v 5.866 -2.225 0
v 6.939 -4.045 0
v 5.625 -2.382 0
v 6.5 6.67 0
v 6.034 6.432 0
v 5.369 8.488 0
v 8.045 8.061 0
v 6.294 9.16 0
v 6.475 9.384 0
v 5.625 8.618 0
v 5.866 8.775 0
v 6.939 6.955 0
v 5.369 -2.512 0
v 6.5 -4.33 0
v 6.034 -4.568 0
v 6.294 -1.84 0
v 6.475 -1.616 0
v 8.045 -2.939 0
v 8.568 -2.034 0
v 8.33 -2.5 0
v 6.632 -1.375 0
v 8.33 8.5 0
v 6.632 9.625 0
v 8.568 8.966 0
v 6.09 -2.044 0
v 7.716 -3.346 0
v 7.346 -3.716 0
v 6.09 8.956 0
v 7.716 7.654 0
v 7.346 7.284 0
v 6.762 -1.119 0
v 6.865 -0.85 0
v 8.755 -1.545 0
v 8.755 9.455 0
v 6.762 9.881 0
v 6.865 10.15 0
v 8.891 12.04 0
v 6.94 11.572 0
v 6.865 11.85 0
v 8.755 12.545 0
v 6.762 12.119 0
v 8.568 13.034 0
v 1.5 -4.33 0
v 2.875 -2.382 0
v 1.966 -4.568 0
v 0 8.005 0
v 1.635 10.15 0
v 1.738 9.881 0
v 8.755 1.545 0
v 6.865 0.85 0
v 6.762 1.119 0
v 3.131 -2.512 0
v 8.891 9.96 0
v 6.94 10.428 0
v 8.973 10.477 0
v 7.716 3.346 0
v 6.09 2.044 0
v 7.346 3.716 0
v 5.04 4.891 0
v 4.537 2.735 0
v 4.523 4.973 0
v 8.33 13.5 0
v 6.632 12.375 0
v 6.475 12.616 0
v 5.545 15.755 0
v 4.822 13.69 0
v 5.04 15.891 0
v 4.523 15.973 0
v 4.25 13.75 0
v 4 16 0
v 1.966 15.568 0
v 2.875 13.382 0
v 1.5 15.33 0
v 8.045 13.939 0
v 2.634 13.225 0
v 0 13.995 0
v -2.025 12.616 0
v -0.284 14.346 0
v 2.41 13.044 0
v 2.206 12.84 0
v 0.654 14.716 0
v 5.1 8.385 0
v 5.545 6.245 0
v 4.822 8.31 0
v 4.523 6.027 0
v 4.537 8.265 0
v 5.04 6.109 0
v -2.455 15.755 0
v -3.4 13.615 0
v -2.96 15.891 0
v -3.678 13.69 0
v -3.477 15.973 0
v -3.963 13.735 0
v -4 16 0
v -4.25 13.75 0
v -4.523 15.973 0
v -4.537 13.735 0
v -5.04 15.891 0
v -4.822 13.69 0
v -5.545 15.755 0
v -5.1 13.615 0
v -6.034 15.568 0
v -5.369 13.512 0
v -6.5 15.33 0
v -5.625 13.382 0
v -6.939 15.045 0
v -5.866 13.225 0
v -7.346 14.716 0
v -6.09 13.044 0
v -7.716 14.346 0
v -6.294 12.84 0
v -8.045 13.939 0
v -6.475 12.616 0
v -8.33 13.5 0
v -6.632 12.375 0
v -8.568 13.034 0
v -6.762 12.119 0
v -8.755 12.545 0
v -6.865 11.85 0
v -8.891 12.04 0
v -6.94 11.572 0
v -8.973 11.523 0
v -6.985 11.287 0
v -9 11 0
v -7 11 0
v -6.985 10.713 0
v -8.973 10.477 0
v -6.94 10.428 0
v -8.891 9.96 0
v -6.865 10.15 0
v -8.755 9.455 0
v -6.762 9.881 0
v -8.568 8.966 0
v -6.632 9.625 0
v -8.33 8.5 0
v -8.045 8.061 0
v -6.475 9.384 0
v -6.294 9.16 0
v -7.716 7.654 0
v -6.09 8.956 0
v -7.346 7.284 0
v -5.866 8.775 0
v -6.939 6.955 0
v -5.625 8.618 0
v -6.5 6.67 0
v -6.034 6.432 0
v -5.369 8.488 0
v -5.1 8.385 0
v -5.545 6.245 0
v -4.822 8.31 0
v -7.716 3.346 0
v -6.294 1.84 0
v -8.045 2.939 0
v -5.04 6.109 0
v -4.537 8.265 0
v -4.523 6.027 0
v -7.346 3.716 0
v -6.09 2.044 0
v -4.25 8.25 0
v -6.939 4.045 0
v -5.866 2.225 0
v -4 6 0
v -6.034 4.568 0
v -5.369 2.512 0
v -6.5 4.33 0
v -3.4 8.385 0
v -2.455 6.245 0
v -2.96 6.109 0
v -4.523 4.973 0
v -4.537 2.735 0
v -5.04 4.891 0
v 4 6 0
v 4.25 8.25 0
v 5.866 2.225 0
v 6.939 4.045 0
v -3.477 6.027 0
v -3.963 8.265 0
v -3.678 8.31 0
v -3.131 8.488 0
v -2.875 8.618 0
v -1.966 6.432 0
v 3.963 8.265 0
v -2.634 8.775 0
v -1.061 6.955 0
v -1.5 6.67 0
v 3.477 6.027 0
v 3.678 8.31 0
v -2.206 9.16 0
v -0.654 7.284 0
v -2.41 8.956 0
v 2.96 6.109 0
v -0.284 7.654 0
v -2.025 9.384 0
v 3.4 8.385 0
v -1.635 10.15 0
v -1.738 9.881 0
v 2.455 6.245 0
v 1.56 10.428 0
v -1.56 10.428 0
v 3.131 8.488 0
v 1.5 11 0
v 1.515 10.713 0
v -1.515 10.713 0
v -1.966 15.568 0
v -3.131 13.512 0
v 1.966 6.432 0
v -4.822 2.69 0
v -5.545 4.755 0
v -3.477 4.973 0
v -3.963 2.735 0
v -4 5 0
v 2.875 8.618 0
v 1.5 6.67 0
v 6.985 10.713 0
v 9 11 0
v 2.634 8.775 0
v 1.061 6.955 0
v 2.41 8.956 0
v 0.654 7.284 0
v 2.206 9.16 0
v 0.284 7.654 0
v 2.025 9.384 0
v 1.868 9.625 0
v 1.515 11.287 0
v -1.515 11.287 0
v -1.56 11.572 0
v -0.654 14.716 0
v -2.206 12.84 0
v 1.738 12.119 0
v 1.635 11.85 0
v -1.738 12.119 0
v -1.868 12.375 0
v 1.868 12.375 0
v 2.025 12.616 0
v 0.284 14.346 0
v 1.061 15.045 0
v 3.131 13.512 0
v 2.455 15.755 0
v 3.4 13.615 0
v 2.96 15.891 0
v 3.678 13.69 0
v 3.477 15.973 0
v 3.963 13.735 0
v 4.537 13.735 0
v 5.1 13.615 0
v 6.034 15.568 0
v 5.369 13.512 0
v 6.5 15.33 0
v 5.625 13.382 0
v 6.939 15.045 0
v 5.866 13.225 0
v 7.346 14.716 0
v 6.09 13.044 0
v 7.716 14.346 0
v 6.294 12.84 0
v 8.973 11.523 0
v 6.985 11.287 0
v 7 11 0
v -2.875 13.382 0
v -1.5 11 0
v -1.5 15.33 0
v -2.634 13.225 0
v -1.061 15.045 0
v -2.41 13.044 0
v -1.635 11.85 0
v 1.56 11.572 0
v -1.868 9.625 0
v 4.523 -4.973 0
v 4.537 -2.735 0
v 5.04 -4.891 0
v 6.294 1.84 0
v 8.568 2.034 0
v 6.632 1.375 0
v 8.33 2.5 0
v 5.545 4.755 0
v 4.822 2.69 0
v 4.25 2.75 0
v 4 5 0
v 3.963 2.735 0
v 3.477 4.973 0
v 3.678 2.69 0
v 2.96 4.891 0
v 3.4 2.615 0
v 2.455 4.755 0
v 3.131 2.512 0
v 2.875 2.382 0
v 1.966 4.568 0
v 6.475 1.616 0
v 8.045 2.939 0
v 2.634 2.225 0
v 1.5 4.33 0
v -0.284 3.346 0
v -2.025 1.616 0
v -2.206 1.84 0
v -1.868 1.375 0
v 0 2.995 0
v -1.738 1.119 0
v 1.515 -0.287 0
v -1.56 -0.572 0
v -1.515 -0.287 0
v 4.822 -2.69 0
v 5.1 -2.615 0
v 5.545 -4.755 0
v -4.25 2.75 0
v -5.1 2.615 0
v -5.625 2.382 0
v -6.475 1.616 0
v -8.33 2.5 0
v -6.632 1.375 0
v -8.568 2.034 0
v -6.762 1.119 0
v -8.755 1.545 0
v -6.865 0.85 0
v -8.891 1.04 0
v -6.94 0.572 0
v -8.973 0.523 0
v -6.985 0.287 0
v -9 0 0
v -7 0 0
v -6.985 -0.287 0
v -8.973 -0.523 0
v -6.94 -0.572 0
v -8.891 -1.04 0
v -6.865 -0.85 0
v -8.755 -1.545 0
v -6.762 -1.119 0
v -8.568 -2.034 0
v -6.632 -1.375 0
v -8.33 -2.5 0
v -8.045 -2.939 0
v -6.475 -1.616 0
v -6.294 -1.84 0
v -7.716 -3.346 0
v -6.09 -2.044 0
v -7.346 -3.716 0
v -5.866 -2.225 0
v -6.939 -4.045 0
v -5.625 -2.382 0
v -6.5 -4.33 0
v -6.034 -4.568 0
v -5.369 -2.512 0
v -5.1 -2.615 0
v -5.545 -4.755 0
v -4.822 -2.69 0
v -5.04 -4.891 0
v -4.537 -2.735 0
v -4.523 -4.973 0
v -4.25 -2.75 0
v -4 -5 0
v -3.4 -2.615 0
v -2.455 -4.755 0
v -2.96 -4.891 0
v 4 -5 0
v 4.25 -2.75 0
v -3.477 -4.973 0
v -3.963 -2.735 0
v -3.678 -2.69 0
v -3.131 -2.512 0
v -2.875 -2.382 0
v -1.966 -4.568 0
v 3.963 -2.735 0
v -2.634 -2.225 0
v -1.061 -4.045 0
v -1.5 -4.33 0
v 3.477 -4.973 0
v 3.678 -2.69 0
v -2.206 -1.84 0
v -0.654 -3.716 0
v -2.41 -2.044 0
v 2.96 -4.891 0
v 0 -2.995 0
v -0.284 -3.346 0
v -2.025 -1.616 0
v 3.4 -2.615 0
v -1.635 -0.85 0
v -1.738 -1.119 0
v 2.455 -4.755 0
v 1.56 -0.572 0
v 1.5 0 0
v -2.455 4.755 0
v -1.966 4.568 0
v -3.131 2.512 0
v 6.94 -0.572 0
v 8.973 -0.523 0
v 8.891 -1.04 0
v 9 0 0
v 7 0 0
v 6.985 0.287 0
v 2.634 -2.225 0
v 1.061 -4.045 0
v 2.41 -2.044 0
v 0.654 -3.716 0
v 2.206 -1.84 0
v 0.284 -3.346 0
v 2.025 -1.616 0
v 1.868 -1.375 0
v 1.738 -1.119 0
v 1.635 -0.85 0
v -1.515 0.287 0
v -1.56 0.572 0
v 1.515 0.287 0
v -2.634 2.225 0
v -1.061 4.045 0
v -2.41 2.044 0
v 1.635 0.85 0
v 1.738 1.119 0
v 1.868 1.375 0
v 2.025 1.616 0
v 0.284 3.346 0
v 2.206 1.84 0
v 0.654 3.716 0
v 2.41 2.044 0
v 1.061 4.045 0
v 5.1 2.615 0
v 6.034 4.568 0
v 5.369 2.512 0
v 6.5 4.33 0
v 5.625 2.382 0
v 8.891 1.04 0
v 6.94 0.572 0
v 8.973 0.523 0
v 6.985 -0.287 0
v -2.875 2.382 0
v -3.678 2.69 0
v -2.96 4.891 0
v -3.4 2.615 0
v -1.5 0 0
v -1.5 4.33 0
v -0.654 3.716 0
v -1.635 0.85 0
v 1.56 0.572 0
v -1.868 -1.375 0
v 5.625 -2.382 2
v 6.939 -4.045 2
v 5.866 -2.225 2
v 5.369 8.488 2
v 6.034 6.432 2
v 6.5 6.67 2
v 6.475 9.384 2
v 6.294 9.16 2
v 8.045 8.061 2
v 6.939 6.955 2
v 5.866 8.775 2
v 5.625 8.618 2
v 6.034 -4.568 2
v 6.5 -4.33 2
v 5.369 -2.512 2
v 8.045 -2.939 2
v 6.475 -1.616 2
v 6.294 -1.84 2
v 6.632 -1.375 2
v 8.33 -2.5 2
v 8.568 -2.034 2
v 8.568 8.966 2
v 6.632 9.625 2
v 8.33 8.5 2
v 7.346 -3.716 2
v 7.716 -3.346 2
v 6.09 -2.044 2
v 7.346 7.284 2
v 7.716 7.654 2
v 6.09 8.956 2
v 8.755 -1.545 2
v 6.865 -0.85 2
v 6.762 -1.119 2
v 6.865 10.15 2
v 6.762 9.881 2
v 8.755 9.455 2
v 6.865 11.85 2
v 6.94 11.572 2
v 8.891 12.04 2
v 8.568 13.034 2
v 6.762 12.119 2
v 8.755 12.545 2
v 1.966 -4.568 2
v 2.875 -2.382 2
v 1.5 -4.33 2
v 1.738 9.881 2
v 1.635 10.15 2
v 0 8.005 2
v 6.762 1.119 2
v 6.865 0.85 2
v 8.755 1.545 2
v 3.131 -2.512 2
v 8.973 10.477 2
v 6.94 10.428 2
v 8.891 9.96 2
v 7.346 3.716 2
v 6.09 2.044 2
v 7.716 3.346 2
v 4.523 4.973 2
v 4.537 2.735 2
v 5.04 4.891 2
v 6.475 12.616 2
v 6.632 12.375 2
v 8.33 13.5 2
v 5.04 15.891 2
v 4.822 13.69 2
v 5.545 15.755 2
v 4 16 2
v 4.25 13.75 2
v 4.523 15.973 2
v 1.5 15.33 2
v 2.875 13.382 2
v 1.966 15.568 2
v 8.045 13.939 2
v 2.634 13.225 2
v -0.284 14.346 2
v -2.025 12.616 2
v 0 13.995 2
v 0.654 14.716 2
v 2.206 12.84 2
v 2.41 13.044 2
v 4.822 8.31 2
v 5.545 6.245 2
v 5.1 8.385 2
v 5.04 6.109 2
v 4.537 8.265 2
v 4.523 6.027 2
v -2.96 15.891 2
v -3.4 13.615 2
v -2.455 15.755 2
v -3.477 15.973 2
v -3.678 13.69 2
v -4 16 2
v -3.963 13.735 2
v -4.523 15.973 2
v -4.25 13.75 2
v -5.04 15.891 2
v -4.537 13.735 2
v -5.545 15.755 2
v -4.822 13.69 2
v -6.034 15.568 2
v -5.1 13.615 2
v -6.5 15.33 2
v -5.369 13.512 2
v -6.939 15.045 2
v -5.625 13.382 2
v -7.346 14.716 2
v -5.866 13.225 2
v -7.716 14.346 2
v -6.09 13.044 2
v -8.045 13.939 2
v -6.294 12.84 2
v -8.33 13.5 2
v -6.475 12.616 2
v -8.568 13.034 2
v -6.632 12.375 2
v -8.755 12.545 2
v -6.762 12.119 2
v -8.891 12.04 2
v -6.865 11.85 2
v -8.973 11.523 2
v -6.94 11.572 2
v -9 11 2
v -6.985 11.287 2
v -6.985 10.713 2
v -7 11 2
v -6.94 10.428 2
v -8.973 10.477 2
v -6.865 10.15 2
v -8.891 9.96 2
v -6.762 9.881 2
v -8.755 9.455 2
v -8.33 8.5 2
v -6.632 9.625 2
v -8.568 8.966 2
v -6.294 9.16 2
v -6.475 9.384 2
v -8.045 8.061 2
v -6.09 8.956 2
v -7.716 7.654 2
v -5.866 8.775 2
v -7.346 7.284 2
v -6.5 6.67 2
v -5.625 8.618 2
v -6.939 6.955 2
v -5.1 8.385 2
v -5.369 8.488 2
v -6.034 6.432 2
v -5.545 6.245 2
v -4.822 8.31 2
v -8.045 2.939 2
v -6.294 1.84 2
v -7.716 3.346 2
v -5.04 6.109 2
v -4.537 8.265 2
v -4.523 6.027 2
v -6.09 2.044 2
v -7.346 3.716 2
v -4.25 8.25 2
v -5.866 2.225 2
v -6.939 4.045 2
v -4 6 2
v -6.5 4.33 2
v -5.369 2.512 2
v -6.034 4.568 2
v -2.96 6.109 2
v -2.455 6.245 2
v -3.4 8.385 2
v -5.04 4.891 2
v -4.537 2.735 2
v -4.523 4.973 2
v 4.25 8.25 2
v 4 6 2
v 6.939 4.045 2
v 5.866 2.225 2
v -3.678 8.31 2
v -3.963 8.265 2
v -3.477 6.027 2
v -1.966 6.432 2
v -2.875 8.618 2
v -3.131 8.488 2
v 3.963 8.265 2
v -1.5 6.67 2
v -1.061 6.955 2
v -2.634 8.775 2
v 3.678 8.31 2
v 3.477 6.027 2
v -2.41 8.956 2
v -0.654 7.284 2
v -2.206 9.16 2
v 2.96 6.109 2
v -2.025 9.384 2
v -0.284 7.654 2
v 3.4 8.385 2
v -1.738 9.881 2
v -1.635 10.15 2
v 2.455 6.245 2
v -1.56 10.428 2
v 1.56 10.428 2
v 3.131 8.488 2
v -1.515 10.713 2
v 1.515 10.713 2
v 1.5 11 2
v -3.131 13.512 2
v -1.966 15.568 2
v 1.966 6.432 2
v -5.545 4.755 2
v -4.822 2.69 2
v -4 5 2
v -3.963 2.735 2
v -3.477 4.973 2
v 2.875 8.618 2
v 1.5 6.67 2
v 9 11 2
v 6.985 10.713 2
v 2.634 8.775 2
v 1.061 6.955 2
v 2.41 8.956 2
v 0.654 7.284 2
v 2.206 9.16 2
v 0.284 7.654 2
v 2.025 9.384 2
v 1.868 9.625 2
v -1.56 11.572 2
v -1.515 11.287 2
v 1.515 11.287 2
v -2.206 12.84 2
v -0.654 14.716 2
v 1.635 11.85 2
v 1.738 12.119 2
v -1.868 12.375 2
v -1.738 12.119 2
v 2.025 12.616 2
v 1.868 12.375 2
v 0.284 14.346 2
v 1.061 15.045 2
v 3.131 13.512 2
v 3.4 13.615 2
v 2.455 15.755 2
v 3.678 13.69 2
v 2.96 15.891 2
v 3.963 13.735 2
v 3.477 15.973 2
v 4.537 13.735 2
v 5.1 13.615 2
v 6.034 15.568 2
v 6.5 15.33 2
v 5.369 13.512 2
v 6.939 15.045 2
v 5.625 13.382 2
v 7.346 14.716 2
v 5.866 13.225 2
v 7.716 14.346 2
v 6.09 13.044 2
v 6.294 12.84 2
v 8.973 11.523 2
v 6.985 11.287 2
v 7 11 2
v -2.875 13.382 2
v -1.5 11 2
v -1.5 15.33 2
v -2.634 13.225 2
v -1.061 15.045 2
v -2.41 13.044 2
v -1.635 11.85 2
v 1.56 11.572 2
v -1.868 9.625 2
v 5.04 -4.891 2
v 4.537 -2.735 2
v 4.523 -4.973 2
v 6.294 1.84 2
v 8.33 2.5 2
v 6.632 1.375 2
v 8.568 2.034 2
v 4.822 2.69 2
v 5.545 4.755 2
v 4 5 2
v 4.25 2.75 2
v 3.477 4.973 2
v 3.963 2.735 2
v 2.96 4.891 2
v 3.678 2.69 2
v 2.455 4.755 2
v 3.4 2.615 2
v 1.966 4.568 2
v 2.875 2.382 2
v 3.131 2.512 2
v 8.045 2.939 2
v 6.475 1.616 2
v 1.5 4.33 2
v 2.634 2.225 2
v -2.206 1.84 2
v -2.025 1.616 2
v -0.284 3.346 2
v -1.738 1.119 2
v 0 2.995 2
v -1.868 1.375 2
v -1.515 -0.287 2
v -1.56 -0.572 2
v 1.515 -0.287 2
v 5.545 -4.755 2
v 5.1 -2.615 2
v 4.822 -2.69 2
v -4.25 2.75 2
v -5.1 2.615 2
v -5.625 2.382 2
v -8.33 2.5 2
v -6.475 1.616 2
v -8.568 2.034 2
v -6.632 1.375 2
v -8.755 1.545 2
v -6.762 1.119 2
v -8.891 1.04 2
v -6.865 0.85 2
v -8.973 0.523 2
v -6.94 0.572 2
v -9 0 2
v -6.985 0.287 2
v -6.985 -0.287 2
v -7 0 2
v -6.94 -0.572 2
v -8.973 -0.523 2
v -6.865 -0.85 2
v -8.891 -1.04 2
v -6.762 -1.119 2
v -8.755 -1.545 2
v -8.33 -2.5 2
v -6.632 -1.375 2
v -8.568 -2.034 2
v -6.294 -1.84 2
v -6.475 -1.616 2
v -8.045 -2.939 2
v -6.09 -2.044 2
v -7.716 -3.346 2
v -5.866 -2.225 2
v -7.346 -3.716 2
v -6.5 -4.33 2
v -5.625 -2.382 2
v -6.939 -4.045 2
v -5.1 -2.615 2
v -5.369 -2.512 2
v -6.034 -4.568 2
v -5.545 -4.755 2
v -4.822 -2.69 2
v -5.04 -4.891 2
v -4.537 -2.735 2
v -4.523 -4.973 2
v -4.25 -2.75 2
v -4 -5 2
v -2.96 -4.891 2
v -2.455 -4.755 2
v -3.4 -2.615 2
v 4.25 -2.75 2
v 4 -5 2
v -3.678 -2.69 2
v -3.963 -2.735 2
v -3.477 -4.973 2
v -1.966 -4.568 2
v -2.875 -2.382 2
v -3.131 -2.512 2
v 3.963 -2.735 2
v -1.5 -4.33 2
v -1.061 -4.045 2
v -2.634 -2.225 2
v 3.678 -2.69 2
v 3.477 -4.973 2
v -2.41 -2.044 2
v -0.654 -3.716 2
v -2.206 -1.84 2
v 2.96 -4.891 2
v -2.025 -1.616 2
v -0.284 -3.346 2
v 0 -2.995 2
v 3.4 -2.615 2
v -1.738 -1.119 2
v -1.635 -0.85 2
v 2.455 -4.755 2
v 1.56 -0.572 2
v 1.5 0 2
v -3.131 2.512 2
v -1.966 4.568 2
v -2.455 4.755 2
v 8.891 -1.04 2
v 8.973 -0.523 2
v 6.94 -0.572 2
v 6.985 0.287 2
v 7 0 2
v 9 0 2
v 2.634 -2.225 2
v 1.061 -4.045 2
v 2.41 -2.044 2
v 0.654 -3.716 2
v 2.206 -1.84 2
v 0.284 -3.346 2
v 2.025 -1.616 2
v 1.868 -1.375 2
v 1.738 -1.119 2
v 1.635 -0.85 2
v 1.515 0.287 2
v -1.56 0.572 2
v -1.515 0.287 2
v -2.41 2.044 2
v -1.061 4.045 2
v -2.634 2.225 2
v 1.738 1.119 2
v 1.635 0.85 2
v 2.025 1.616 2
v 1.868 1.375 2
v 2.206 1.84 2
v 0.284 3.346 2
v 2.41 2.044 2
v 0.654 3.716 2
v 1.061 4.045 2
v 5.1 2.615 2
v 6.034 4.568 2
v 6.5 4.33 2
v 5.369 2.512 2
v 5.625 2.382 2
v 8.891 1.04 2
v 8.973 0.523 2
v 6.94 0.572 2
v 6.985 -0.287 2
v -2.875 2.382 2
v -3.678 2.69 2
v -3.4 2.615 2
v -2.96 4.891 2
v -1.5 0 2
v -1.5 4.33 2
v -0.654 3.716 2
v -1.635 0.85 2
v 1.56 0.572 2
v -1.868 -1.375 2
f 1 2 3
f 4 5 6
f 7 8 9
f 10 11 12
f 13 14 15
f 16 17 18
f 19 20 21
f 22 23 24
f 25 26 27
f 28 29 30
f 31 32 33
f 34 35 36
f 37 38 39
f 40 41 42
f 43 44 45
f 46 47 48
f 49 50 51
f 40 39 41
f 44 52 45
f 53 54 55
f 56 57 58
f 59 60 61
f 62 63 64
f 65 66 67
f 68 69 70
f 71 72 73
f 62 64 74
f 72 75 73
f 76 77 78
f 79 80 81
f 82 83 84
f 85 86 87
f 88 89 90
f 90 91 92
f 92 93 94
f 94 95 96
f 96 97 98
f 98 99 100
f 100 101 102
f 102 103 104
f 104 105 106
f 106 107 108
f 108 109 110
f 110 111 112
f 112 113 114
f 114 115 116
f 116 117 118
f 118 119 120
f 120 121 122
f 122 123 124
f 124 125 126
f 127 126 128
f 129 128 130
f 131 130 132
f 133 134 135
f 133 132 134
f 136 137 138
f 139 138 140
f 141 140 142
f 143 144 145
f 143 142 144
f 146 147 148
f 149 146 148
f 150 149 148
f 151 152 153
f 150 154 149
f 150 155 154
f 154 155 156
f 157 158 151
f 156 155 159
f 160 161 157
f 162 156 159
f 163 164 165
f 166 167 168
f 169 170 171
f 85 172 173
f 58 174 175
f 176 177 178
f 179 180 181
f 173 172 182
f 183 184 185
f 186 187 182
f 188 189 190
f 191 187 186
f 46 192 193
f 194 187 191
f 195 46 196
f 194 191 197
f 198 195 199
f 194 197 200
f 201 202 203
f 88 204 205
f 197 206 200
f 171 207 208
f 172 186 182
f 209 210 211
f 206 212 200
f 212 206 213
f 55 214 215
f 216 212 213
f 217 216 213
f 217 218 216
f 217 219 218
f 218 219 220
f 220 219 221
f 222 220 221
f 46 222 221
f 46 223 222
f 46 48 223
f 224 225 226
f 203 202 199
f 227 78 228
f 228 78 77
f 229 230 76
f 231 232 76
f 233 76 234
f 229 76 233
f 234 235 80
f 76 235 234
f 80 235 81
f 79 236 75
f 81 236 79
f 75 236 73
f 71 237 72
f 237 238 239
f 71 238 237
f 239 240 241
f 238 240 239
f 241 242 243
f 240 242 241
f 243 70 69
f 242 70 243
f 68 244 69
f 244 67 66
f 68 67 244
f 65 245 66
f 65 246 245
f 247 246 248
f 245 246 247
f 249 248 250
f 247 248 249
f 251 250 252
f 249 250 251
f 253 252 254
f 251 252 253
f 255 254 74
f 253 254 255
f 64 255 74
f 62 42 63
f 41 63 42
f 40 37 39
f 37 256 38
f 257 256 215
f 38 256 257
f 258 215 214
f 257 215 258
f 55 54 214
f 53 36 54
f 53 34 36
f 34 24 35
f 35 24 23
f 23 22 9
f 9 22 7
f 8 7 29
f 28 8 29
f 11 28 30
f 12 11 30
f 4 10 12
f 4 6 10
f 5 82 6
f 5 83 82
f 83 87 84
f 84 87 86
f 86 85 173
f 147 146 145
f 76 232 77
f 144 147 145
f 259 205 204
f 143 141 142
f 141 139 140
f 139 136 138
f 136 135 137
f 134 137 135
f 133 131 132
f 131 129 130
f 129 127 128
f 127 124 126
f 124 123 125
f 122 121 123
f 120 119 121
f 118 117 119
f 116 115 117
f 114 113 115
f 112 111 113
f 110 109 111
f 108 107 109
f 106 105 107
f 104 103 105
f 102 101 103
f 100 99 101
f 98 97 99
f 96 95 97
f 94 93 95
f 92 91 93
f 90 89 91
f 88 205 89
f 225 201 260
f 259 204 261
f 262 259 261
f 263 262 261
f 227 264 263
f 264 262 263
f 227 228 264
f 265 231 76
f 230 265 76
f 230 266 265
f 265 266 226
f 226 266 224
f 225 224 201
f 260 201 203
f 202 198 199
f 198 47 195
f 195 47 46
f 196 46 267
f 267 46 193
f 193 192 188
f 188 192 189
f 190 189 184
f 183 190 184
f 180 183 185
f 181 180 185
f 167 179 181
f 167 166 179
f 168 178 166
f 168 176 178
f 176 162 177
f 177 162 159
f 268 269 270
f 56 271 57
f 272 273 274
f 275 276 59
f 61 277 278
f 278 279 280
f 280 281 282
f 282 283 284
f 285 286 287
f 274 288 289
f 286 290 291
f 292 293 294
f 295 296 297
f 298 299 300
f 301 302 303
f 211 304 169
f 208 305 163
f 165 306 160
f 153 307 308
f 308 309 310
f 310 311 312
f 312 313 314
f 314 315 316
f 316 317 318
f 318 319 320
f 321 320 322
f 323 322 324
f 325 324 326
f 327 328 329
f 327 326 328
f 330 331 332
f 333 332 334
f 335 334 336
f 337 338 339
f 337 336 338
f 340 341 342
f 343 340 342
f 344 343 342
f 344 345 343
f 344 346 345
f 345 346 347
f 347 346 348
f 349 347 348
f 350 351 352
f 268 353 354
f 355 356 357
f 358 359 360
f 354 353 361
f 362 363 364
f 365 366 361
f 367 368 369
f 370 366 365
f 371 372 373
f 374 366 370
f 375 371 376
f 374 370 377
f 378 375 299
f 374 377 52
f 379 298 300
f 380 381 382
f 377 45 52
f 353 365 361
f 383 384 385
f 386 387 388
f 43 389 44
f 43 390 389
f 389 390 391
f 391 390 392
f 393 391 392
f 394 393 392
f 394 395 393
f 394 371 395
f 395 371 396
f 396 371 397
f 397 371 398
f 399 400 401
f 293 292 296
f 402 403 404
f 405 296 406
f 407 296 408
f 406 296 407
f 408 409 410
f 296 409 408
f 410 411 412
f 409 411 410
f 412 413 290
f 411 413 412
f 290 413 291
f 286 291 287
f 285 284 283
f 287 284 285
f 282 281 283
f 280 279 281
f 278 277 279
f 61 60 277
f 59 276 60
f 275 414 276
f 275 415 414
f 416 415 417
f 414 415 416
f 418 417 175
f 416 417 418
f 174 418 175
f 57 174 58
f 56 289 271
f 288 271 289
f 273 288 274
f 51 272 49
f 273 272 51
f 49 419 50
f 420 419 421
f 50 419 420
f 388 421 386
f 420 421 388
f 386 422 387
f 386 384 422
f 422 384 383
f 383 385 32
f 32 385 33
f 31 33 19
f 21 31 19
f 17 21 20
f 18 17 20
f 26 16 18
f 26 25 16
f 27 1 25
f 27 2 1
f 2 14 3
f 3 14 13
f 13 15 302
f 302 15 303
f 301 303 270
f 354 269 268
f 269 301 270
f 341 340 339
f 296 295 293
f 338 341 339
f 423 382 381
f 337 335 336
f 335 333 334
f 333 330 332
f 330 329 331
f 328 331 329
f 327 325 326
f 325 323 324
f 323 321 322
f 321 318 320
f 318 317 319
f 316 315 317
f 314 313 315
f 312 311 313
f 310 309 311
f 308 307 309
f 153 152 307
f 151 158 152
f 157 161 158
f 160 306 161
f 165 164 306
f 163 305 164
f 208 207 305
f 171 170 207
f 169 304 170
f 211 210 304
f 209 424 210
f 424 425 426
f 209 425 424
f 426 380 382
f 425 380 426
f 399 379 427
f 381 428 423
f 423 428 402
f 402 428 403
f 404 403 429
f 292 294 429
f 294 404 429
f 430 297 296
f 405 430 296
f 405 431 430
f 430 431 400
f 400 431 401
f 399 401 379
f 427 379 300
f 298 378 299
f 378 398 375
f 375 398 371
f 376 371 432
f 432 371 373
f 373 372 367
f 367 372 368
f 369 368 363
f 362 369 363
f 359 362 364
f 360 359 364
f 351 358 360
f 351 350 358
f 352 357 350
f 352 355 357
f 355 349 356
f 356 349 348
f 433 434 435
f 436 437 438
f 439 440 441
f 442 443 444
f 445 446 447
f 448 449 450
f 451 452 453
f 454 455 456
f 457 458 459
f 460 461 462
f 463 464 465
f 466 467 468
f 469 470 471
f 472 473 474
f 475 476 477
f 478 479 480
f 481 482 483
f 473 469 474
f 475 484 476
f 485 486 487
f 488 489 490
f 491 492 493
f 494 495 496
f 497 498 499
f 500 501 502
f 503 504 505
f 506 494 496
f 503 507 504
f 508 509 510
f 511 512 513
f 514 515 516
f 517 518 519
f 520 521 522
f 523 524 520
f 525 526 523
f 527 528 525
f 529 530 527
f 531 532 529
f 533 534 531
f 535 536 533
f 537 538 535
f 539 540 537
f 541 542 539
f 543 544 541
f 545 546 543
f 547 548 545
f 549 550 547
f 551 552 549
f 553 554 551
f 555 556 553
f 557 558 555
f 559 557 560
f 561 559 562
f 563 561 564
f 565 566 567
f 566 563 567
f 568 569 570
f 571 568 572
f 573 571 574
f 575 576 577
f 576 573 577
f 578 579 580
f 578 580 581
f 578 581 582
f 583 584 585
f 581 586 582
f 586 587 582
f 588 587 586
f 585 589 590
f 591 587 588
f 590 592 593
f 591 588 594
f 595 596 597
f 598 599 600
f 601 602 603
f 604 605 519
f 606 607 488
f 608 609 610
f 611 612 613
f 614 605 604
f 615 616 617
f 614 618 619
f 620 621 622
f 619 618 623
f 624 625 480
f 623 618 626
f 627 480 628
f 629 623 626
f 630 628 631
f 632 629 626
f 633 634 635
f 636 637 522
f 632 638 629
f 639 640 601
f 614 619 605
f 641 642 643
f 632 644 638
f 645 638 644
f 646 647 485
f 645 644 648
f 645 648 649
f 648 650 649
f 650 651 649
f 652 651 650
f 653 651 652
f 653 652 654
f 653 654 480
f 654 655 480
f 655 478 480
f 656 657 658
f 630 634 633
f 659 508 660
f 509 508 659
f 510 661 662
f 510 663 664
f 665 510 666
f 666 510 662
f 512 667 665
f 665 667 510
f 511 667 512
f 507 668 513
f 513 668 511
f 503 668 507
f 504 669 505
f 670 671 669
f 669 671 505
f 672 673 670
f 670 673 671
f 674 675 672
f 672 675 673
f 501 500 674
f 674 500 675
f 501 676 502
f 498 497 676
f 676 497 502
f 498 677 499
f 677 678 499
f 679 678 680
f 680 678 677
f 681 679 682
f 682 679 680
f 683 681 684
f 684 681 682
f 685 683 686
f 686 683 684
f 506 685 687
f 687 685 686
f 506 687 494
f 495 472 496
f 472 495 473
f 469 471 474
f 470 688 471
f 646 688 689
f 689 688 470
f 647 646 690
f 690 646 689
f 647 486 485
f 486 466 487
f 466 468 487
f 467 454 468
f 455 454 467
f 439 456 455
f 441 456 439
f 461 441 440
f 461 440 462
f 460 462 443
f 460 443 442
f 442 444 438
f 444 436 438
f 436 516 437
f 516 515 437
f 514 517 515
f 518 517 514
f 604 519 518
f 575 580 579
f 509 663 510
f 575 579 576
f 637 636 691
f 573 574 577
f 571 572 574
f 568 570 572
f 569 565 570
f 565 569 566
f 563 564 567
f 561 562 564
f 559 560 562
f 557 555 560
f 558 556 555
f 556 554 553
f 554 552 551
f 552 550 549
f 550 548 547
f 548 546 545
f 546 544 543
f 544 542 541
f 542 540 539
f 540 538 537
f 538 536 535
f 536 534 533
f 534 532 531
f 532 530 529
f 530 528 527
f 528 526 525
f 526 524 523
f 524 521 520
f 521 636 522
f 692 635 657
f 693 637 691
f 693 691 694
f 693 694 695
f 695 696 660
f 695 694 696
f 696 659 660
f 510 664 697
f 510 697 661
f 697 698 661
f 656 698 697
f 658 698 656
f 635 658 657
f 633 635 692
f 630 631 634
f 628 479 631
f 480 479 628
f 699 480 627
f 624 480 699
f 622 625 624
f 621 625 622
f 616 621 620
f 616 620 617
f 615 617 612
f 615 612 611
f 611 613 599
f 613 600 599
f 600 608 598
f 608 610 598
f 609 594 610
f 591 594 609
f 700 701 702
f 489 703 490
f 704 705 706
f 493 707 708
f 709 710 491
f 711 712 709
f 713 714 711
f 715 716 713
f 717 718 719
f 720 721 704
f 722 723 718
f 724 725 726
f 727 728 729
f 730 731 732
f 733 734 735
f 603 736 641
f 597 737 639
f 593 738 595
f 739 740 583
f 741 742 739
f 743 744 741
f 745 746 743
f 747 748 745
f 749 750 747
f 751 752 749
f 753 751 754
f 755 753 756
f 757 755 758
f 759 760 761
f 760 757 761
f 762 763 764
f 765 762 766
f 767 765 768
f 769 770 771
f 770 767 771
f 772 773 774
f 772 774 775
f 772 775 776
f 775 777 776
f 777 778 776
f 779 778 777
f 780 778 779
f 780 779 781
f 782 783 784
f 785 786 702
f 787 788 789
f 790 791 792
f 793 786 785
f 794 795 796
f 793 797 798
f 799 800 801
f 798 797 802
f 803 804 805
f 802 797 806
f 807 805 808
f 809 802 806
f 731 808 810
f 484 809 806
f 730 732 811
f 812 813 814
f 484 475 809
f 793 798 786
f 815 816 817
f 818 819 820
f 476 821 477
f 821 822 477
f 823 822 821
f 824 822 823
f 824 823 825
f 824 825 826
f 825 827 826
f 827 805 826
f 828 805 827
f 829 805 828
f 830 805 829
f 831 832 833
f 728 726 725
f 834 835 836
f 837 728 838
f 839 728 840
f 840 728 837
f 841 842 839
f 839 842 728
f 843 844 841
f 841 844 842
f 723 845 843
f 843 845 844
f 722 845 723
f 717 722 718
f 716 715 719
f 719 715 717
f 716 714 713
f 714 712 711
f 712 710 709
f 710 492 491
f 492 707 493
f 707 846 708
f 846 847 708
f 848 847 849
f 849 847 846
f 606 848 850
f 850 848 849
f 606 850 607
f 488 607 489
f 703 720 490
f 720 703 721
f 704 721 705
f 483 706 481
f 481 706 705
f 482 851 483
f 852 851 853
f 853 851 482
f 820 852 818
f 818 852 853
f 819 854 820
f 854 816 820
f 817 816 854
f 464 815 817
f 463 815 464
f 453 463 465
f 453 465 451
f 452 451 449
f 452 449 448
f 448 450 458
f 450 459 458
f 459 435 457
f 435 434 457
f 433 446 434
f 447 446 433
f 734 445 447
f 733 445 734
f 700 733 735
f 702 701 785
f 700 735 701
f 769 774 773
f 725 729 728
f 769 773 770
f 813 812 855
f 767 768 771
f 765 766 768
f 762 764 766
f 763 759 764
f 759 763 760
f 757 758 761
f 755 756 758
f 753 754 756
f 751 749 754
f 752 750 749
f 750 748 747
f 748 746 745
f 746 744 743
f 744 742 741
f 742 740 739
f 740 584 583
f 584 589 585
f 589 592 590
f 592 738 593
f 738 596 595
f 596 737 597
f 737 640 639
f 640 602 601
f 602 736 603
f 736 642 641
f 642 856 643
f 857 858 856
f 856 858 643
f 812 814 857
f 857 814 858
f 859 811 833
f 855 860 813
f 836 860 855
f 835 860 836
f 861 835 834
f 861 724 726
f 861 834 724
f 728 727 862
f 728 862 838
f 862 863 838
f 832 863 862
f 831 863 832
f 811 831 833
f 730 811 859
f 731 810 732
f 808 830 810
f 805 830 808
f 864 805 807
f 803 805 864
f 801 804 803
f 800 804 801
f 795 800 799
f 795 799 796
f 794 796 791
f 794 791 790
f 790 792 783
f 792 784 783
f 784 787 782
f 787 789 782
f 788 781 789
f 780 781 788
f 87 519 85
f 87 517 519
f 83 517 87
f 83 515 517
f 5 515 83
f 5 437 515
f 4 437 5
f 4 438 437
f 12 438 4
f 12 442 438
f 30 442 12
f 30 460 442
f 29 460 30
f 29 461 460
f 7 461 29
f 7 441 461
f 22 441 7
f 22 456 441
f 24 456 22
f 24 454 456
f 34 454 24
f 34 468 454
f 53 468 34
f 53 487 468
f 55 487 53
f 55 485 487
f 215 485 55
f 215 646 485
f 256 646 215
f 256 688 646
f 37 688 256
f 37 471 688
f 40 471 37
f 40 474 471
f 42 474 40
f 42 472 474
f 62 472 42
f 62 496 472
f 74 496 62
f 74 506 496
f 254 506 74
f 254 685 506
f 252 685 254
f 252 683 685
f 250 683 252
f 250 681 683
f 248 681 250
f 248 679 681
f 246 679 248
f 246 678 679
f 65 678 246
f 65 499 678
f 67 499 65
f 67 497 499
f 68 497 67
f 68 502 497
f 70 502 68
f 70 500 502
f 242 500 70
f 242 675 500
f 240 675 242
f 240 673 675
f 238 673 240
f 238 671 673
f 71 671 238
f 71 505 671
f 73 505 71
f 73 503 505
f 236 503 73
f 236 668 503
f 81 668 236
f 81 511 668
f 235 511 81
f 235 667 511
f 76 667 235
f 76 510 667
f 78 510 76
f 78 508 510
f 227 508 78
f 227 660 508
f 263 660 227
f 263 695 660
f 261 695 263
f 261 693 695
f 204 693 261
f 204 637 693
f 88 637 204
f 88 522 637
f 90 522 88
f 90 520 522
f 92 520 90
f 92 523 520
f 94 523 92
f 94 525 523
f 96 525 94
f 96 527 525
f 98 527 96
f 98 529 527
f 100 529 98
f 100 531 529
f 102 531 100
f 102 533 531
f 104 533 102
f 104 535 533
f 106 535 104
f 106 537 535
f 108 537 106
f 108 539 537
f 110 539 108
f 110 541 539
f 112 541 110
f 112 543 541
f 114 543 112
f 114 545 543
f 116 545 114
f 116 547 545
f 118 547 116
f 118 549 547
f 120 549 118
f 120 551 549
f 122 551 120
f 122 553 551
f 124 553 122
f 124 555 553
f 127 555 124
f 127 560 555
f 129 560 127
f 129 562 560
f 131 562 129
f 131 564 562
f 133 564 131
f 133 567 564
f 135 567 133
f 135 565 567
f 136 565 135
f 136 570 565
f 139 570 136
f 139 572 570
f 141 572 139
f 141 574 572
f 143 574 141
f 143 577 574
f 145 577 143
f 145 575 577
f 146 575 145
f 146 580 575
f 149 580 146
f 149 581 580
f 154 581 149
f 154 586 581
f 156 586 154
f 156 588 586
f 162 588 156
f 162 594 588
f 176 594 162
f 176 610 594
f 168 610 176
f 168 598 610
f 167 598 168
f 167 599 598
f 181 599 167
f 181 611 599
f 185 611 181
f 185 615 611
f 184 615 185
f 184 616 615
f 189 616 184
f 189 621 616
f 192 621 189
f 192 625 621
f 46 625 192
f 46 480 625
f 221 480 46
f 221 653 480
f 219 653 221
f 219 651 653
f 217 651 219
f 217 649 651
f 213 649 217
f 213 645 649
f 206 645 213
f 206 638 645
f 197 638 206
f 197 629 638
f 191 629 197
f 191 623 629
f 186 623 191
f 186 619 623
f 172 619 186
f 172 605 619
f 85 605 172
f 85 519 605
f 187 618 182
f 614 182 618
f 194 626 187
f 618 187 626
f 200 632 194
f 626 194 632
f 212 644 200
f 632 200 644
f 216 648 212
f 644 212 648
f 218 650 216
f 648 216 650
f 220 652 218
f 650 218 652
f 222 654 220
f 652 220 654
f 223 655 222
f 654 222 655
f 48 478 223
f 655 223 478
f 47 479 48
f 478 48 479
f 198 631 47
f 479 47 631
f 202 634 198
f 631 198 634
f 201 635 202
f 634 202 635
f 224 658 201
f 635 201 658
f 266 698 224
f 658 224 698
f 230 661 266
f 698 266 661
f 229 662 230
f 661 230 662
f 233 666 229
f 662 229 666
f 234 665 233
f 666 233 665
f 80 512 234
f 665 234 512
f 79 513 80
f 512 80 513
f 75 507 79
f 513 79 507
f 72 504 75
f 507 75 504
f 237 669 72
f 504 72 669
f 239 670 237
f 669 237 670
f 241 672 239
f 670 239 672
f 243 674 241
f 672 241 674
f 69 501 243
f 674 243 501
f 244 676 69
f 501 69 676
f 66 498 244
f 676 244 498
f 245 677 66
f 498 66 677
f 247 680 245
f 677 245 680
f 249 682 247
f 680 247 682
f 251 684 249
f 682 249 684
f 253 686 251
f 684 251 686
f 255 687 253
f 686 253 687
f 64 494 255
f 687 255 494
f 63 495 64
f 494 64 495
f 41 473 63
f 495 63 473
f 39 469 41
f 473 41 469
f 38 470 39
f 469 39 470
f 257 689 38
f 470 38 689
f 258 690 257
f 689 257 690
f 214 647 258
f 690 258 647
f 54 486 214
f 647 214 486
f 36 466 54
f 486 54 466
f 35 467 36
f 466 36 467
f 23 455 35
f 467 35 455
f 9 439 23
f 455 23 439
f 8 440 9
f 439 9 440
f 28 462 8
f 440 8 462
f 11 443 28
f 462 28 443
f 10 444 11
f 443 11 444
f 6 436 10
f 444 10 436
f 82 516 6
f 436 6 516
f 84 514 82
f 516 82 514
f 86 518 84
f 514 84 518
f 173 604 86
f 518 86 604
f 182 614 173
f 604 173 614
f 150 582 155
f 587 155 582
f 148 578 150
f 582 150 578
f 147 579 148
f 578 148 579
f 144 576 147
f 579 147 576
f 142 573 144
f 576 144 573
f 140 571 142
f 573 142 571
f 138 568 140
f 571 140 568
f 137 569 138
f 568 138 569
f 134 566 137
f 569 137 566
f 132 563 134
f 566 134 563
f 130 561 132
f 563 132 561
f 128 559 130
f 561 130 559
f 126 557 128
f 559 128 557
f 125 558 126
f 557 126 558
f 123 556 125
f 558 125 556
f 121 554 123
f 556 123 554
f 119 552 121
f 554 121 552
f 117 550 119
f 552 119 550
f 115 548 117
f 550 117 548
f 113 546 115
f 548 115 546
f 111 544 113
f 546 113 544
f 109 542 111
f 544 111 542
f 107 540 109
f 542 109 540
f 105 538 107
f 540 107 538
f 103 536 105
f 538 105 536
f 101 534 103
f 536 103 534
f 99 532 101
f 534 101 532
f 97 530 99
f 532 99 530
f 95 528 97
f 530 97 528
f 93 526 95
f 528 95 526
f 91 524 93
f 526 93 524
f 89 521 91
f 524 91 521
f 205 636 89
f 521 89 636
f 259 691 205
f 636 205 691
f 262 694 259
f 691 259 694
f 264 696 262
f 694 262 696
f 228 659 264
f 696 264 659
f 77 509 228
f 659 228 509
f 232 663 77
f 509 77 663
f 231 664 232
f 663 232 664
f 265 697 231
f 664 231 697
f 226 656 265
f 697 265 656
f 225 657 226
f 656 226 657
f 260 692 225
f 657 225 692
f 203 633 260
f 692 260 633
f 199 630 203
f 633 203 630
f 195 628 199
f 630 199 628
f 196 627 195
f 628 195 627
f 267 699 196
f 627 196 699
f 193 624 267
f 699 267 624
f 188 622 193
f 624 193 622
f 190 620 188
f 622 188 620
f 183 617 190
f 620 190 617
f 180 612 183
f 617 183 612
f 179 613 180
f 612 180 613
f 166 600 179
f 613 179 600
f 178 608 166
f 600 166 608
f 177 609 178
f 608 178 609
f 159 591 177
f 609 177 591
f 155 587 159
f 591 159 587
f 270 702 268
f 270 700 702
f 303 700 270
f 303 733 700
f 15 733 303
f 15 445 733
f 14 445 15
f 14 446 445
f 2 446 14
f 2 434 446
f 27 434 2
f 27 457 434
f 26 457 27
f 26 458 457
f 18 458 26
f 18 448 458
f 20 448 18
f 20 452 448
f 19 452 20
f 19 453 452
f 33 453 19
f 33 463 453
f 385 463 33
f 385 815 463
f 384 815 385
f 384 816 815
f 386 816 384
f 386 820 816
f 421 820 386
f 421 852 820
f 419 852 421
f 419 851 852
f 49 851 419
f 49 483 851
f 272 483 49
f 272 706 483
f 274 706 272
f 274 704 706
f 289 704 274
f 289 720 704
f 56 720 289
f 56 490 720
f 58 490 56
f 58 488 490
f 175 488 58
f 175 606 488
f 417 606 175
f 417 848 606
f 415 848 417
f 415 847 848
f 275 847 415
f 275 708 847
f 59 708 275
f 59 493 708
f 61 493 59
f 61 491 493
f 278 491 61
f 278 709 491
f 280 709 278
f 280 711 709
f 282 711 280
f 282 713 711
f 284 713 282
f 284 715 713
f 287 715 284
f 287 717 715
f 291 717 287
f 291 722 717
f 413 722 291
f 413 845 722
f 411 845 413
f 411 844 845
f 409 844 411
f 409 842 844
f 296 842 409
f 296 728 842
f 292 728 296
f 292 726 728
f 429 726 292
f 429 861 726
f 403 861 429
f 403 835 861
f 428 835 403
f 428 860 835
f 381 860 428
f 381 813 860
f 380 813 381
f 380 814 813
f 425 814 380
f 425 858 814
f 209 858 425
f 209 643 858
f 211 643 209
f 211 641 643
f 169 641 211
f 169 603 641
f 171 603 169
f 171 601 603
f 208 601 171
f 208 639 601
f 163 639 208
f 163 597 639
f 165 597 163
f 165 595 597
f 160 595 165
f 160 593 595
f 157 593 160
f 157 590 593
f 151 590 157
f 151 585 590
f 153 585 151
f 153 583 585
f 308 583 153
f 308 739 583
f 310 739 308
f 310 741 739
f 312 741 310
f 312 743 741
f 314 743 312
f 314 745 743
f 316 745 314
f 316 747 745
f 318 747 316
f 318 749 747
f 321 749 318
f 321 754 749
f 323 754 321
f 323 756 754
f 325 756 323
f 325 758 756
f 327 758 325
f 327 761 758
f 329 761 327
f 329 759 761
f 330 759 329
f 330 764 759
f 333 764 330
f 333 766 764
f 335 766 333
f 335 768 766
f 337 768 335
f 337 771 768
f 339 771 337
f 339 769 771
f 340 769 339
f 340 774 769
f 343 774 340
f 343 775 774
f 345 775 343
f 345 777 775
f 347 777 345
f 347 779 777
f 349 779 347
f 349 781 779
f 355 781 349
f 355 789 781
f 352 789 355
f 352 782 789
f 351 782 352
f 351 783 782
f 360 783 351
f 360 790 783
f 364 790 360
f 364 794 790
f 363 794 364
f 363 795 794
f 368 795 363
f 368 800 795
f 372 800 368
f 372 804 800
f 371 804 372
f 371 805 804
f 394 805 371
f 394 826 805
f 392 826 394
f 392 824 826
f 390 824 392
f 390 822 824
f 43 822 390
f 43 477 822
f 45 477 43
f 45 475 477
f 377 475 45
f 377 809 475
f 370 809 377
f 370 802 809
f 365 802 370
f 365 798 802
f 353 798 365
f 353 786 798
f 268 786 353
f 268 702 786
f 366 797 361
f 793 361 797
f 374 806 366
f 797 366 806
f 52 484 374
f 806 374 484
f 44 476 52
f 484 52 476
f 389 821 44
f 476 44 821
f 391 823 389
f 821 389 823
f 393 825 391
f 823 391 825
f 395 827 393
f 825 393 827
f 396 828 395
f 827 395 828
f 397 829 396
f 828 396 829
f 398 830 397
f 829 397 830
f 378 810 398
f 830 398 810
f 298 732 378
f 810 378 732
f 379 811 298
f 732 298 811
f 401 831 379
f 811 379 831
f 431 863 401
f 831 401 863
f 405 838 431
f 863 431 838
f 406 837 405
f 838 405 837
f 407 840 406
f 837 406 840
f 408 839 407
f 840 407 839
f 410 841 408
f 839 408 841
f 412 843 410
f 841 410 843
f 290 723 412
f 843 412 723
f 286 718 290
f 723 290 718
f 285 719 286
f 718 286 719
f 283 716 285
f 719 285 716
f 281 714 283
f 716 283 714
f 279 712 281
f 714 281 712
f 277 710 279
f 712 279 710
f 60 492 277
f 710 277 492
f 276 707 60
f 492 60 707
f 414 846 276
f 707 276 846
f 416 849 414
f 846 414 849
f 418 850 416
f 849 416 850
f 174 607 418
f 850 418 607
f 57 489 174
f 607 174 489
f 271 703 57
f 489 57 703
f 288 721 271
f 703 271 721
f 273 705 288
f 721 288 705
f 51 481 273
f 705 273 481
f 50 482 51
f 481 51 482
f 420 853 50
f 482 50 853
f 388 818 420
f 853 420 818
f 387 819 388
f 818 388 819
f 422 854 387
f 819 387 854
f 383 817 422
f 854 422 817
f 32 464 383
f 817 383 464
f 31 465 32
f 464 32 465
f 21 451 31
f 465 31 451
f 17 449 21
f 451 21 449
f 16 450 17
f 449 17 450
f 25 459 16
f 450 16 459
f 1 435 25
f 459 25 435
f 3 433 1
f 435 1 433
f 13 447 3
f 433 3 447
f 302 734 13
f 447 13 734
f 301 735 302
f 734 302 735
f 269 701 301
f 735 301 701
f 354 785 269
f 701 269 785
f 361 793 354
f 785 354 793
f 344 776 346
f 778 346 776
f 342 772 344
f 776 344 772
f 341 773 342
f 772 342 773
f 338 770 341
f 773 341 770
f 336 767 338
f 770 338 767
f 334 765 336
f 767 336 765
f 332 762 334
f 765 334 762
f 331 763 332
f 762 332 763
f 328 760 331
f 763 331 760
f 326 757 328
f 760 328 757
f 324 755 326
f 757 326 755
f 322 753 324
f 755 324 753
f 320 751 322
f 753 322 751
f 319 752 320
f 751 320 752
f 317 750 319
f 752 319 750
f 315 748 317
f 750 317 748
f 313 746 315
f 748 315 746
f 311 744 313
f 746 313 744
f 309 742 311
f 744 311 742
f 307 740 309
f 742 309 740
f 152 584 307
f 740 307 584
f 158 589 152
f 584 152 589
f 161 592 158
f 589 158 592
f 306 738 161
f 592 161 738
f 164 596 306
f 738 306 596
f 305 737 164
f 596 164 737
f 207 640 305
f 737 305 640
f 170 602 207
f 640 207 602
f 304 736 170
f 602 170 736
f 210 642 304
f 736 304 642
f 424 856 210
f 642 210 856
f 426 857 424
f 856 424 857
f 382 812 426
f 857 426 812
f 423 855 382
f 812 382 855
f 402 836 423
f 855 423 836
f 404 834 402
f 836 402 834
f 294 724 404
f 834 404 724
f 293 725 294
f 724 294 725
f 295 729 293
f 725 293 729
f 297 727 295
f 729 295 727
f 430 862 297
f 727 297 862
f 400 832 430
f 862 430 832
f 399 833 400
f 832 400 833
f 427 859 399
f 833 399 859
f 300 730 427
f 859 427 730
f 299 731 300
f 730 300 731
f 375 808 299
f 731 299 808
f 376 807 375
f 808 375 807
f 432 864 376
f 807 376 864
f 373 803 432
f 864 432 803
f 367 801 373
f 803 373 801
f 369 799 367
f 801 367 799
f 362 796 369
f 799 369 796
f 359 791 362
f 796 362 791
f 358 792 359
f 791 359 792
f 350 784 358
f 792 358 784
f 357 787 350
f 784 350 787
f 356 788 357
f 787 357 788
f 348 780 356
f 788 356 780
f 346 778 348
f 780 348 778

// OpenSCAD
// needle size
holeSize = 5;
number = 2;

module earing_holder () {
    difference() {
        union() {
            translate ([4,0,0])
                scale ([1,1,1])
                circle (d=10,center=true);
            translate ([-4,0,0])
                scale ([1,1,1])
                circle (d=10,center=true);
        }
        union() {
            holeCenter = 4+5-2 -(holeSize+tolerance)/2; 
            translate ([holeCenter,0,-1])
                circle (d=holeSize+tolerance,center=true);
            translate ([-holeCenter,0,-1])
                circle (d=holeSize+tolerance,center=true);
        }
    };
}

// for volume printg
rows = 1;


tolerance = 0.5;

object_quality = 60;
$fn = object_quality;

linear_extrude(height=2)
for (j=[0:number-1]) {
    for (i=[0:rows-1]) {
        translate ([(18+2)*i,(9+2)*j,0])
        earing_holder();
    }
}
